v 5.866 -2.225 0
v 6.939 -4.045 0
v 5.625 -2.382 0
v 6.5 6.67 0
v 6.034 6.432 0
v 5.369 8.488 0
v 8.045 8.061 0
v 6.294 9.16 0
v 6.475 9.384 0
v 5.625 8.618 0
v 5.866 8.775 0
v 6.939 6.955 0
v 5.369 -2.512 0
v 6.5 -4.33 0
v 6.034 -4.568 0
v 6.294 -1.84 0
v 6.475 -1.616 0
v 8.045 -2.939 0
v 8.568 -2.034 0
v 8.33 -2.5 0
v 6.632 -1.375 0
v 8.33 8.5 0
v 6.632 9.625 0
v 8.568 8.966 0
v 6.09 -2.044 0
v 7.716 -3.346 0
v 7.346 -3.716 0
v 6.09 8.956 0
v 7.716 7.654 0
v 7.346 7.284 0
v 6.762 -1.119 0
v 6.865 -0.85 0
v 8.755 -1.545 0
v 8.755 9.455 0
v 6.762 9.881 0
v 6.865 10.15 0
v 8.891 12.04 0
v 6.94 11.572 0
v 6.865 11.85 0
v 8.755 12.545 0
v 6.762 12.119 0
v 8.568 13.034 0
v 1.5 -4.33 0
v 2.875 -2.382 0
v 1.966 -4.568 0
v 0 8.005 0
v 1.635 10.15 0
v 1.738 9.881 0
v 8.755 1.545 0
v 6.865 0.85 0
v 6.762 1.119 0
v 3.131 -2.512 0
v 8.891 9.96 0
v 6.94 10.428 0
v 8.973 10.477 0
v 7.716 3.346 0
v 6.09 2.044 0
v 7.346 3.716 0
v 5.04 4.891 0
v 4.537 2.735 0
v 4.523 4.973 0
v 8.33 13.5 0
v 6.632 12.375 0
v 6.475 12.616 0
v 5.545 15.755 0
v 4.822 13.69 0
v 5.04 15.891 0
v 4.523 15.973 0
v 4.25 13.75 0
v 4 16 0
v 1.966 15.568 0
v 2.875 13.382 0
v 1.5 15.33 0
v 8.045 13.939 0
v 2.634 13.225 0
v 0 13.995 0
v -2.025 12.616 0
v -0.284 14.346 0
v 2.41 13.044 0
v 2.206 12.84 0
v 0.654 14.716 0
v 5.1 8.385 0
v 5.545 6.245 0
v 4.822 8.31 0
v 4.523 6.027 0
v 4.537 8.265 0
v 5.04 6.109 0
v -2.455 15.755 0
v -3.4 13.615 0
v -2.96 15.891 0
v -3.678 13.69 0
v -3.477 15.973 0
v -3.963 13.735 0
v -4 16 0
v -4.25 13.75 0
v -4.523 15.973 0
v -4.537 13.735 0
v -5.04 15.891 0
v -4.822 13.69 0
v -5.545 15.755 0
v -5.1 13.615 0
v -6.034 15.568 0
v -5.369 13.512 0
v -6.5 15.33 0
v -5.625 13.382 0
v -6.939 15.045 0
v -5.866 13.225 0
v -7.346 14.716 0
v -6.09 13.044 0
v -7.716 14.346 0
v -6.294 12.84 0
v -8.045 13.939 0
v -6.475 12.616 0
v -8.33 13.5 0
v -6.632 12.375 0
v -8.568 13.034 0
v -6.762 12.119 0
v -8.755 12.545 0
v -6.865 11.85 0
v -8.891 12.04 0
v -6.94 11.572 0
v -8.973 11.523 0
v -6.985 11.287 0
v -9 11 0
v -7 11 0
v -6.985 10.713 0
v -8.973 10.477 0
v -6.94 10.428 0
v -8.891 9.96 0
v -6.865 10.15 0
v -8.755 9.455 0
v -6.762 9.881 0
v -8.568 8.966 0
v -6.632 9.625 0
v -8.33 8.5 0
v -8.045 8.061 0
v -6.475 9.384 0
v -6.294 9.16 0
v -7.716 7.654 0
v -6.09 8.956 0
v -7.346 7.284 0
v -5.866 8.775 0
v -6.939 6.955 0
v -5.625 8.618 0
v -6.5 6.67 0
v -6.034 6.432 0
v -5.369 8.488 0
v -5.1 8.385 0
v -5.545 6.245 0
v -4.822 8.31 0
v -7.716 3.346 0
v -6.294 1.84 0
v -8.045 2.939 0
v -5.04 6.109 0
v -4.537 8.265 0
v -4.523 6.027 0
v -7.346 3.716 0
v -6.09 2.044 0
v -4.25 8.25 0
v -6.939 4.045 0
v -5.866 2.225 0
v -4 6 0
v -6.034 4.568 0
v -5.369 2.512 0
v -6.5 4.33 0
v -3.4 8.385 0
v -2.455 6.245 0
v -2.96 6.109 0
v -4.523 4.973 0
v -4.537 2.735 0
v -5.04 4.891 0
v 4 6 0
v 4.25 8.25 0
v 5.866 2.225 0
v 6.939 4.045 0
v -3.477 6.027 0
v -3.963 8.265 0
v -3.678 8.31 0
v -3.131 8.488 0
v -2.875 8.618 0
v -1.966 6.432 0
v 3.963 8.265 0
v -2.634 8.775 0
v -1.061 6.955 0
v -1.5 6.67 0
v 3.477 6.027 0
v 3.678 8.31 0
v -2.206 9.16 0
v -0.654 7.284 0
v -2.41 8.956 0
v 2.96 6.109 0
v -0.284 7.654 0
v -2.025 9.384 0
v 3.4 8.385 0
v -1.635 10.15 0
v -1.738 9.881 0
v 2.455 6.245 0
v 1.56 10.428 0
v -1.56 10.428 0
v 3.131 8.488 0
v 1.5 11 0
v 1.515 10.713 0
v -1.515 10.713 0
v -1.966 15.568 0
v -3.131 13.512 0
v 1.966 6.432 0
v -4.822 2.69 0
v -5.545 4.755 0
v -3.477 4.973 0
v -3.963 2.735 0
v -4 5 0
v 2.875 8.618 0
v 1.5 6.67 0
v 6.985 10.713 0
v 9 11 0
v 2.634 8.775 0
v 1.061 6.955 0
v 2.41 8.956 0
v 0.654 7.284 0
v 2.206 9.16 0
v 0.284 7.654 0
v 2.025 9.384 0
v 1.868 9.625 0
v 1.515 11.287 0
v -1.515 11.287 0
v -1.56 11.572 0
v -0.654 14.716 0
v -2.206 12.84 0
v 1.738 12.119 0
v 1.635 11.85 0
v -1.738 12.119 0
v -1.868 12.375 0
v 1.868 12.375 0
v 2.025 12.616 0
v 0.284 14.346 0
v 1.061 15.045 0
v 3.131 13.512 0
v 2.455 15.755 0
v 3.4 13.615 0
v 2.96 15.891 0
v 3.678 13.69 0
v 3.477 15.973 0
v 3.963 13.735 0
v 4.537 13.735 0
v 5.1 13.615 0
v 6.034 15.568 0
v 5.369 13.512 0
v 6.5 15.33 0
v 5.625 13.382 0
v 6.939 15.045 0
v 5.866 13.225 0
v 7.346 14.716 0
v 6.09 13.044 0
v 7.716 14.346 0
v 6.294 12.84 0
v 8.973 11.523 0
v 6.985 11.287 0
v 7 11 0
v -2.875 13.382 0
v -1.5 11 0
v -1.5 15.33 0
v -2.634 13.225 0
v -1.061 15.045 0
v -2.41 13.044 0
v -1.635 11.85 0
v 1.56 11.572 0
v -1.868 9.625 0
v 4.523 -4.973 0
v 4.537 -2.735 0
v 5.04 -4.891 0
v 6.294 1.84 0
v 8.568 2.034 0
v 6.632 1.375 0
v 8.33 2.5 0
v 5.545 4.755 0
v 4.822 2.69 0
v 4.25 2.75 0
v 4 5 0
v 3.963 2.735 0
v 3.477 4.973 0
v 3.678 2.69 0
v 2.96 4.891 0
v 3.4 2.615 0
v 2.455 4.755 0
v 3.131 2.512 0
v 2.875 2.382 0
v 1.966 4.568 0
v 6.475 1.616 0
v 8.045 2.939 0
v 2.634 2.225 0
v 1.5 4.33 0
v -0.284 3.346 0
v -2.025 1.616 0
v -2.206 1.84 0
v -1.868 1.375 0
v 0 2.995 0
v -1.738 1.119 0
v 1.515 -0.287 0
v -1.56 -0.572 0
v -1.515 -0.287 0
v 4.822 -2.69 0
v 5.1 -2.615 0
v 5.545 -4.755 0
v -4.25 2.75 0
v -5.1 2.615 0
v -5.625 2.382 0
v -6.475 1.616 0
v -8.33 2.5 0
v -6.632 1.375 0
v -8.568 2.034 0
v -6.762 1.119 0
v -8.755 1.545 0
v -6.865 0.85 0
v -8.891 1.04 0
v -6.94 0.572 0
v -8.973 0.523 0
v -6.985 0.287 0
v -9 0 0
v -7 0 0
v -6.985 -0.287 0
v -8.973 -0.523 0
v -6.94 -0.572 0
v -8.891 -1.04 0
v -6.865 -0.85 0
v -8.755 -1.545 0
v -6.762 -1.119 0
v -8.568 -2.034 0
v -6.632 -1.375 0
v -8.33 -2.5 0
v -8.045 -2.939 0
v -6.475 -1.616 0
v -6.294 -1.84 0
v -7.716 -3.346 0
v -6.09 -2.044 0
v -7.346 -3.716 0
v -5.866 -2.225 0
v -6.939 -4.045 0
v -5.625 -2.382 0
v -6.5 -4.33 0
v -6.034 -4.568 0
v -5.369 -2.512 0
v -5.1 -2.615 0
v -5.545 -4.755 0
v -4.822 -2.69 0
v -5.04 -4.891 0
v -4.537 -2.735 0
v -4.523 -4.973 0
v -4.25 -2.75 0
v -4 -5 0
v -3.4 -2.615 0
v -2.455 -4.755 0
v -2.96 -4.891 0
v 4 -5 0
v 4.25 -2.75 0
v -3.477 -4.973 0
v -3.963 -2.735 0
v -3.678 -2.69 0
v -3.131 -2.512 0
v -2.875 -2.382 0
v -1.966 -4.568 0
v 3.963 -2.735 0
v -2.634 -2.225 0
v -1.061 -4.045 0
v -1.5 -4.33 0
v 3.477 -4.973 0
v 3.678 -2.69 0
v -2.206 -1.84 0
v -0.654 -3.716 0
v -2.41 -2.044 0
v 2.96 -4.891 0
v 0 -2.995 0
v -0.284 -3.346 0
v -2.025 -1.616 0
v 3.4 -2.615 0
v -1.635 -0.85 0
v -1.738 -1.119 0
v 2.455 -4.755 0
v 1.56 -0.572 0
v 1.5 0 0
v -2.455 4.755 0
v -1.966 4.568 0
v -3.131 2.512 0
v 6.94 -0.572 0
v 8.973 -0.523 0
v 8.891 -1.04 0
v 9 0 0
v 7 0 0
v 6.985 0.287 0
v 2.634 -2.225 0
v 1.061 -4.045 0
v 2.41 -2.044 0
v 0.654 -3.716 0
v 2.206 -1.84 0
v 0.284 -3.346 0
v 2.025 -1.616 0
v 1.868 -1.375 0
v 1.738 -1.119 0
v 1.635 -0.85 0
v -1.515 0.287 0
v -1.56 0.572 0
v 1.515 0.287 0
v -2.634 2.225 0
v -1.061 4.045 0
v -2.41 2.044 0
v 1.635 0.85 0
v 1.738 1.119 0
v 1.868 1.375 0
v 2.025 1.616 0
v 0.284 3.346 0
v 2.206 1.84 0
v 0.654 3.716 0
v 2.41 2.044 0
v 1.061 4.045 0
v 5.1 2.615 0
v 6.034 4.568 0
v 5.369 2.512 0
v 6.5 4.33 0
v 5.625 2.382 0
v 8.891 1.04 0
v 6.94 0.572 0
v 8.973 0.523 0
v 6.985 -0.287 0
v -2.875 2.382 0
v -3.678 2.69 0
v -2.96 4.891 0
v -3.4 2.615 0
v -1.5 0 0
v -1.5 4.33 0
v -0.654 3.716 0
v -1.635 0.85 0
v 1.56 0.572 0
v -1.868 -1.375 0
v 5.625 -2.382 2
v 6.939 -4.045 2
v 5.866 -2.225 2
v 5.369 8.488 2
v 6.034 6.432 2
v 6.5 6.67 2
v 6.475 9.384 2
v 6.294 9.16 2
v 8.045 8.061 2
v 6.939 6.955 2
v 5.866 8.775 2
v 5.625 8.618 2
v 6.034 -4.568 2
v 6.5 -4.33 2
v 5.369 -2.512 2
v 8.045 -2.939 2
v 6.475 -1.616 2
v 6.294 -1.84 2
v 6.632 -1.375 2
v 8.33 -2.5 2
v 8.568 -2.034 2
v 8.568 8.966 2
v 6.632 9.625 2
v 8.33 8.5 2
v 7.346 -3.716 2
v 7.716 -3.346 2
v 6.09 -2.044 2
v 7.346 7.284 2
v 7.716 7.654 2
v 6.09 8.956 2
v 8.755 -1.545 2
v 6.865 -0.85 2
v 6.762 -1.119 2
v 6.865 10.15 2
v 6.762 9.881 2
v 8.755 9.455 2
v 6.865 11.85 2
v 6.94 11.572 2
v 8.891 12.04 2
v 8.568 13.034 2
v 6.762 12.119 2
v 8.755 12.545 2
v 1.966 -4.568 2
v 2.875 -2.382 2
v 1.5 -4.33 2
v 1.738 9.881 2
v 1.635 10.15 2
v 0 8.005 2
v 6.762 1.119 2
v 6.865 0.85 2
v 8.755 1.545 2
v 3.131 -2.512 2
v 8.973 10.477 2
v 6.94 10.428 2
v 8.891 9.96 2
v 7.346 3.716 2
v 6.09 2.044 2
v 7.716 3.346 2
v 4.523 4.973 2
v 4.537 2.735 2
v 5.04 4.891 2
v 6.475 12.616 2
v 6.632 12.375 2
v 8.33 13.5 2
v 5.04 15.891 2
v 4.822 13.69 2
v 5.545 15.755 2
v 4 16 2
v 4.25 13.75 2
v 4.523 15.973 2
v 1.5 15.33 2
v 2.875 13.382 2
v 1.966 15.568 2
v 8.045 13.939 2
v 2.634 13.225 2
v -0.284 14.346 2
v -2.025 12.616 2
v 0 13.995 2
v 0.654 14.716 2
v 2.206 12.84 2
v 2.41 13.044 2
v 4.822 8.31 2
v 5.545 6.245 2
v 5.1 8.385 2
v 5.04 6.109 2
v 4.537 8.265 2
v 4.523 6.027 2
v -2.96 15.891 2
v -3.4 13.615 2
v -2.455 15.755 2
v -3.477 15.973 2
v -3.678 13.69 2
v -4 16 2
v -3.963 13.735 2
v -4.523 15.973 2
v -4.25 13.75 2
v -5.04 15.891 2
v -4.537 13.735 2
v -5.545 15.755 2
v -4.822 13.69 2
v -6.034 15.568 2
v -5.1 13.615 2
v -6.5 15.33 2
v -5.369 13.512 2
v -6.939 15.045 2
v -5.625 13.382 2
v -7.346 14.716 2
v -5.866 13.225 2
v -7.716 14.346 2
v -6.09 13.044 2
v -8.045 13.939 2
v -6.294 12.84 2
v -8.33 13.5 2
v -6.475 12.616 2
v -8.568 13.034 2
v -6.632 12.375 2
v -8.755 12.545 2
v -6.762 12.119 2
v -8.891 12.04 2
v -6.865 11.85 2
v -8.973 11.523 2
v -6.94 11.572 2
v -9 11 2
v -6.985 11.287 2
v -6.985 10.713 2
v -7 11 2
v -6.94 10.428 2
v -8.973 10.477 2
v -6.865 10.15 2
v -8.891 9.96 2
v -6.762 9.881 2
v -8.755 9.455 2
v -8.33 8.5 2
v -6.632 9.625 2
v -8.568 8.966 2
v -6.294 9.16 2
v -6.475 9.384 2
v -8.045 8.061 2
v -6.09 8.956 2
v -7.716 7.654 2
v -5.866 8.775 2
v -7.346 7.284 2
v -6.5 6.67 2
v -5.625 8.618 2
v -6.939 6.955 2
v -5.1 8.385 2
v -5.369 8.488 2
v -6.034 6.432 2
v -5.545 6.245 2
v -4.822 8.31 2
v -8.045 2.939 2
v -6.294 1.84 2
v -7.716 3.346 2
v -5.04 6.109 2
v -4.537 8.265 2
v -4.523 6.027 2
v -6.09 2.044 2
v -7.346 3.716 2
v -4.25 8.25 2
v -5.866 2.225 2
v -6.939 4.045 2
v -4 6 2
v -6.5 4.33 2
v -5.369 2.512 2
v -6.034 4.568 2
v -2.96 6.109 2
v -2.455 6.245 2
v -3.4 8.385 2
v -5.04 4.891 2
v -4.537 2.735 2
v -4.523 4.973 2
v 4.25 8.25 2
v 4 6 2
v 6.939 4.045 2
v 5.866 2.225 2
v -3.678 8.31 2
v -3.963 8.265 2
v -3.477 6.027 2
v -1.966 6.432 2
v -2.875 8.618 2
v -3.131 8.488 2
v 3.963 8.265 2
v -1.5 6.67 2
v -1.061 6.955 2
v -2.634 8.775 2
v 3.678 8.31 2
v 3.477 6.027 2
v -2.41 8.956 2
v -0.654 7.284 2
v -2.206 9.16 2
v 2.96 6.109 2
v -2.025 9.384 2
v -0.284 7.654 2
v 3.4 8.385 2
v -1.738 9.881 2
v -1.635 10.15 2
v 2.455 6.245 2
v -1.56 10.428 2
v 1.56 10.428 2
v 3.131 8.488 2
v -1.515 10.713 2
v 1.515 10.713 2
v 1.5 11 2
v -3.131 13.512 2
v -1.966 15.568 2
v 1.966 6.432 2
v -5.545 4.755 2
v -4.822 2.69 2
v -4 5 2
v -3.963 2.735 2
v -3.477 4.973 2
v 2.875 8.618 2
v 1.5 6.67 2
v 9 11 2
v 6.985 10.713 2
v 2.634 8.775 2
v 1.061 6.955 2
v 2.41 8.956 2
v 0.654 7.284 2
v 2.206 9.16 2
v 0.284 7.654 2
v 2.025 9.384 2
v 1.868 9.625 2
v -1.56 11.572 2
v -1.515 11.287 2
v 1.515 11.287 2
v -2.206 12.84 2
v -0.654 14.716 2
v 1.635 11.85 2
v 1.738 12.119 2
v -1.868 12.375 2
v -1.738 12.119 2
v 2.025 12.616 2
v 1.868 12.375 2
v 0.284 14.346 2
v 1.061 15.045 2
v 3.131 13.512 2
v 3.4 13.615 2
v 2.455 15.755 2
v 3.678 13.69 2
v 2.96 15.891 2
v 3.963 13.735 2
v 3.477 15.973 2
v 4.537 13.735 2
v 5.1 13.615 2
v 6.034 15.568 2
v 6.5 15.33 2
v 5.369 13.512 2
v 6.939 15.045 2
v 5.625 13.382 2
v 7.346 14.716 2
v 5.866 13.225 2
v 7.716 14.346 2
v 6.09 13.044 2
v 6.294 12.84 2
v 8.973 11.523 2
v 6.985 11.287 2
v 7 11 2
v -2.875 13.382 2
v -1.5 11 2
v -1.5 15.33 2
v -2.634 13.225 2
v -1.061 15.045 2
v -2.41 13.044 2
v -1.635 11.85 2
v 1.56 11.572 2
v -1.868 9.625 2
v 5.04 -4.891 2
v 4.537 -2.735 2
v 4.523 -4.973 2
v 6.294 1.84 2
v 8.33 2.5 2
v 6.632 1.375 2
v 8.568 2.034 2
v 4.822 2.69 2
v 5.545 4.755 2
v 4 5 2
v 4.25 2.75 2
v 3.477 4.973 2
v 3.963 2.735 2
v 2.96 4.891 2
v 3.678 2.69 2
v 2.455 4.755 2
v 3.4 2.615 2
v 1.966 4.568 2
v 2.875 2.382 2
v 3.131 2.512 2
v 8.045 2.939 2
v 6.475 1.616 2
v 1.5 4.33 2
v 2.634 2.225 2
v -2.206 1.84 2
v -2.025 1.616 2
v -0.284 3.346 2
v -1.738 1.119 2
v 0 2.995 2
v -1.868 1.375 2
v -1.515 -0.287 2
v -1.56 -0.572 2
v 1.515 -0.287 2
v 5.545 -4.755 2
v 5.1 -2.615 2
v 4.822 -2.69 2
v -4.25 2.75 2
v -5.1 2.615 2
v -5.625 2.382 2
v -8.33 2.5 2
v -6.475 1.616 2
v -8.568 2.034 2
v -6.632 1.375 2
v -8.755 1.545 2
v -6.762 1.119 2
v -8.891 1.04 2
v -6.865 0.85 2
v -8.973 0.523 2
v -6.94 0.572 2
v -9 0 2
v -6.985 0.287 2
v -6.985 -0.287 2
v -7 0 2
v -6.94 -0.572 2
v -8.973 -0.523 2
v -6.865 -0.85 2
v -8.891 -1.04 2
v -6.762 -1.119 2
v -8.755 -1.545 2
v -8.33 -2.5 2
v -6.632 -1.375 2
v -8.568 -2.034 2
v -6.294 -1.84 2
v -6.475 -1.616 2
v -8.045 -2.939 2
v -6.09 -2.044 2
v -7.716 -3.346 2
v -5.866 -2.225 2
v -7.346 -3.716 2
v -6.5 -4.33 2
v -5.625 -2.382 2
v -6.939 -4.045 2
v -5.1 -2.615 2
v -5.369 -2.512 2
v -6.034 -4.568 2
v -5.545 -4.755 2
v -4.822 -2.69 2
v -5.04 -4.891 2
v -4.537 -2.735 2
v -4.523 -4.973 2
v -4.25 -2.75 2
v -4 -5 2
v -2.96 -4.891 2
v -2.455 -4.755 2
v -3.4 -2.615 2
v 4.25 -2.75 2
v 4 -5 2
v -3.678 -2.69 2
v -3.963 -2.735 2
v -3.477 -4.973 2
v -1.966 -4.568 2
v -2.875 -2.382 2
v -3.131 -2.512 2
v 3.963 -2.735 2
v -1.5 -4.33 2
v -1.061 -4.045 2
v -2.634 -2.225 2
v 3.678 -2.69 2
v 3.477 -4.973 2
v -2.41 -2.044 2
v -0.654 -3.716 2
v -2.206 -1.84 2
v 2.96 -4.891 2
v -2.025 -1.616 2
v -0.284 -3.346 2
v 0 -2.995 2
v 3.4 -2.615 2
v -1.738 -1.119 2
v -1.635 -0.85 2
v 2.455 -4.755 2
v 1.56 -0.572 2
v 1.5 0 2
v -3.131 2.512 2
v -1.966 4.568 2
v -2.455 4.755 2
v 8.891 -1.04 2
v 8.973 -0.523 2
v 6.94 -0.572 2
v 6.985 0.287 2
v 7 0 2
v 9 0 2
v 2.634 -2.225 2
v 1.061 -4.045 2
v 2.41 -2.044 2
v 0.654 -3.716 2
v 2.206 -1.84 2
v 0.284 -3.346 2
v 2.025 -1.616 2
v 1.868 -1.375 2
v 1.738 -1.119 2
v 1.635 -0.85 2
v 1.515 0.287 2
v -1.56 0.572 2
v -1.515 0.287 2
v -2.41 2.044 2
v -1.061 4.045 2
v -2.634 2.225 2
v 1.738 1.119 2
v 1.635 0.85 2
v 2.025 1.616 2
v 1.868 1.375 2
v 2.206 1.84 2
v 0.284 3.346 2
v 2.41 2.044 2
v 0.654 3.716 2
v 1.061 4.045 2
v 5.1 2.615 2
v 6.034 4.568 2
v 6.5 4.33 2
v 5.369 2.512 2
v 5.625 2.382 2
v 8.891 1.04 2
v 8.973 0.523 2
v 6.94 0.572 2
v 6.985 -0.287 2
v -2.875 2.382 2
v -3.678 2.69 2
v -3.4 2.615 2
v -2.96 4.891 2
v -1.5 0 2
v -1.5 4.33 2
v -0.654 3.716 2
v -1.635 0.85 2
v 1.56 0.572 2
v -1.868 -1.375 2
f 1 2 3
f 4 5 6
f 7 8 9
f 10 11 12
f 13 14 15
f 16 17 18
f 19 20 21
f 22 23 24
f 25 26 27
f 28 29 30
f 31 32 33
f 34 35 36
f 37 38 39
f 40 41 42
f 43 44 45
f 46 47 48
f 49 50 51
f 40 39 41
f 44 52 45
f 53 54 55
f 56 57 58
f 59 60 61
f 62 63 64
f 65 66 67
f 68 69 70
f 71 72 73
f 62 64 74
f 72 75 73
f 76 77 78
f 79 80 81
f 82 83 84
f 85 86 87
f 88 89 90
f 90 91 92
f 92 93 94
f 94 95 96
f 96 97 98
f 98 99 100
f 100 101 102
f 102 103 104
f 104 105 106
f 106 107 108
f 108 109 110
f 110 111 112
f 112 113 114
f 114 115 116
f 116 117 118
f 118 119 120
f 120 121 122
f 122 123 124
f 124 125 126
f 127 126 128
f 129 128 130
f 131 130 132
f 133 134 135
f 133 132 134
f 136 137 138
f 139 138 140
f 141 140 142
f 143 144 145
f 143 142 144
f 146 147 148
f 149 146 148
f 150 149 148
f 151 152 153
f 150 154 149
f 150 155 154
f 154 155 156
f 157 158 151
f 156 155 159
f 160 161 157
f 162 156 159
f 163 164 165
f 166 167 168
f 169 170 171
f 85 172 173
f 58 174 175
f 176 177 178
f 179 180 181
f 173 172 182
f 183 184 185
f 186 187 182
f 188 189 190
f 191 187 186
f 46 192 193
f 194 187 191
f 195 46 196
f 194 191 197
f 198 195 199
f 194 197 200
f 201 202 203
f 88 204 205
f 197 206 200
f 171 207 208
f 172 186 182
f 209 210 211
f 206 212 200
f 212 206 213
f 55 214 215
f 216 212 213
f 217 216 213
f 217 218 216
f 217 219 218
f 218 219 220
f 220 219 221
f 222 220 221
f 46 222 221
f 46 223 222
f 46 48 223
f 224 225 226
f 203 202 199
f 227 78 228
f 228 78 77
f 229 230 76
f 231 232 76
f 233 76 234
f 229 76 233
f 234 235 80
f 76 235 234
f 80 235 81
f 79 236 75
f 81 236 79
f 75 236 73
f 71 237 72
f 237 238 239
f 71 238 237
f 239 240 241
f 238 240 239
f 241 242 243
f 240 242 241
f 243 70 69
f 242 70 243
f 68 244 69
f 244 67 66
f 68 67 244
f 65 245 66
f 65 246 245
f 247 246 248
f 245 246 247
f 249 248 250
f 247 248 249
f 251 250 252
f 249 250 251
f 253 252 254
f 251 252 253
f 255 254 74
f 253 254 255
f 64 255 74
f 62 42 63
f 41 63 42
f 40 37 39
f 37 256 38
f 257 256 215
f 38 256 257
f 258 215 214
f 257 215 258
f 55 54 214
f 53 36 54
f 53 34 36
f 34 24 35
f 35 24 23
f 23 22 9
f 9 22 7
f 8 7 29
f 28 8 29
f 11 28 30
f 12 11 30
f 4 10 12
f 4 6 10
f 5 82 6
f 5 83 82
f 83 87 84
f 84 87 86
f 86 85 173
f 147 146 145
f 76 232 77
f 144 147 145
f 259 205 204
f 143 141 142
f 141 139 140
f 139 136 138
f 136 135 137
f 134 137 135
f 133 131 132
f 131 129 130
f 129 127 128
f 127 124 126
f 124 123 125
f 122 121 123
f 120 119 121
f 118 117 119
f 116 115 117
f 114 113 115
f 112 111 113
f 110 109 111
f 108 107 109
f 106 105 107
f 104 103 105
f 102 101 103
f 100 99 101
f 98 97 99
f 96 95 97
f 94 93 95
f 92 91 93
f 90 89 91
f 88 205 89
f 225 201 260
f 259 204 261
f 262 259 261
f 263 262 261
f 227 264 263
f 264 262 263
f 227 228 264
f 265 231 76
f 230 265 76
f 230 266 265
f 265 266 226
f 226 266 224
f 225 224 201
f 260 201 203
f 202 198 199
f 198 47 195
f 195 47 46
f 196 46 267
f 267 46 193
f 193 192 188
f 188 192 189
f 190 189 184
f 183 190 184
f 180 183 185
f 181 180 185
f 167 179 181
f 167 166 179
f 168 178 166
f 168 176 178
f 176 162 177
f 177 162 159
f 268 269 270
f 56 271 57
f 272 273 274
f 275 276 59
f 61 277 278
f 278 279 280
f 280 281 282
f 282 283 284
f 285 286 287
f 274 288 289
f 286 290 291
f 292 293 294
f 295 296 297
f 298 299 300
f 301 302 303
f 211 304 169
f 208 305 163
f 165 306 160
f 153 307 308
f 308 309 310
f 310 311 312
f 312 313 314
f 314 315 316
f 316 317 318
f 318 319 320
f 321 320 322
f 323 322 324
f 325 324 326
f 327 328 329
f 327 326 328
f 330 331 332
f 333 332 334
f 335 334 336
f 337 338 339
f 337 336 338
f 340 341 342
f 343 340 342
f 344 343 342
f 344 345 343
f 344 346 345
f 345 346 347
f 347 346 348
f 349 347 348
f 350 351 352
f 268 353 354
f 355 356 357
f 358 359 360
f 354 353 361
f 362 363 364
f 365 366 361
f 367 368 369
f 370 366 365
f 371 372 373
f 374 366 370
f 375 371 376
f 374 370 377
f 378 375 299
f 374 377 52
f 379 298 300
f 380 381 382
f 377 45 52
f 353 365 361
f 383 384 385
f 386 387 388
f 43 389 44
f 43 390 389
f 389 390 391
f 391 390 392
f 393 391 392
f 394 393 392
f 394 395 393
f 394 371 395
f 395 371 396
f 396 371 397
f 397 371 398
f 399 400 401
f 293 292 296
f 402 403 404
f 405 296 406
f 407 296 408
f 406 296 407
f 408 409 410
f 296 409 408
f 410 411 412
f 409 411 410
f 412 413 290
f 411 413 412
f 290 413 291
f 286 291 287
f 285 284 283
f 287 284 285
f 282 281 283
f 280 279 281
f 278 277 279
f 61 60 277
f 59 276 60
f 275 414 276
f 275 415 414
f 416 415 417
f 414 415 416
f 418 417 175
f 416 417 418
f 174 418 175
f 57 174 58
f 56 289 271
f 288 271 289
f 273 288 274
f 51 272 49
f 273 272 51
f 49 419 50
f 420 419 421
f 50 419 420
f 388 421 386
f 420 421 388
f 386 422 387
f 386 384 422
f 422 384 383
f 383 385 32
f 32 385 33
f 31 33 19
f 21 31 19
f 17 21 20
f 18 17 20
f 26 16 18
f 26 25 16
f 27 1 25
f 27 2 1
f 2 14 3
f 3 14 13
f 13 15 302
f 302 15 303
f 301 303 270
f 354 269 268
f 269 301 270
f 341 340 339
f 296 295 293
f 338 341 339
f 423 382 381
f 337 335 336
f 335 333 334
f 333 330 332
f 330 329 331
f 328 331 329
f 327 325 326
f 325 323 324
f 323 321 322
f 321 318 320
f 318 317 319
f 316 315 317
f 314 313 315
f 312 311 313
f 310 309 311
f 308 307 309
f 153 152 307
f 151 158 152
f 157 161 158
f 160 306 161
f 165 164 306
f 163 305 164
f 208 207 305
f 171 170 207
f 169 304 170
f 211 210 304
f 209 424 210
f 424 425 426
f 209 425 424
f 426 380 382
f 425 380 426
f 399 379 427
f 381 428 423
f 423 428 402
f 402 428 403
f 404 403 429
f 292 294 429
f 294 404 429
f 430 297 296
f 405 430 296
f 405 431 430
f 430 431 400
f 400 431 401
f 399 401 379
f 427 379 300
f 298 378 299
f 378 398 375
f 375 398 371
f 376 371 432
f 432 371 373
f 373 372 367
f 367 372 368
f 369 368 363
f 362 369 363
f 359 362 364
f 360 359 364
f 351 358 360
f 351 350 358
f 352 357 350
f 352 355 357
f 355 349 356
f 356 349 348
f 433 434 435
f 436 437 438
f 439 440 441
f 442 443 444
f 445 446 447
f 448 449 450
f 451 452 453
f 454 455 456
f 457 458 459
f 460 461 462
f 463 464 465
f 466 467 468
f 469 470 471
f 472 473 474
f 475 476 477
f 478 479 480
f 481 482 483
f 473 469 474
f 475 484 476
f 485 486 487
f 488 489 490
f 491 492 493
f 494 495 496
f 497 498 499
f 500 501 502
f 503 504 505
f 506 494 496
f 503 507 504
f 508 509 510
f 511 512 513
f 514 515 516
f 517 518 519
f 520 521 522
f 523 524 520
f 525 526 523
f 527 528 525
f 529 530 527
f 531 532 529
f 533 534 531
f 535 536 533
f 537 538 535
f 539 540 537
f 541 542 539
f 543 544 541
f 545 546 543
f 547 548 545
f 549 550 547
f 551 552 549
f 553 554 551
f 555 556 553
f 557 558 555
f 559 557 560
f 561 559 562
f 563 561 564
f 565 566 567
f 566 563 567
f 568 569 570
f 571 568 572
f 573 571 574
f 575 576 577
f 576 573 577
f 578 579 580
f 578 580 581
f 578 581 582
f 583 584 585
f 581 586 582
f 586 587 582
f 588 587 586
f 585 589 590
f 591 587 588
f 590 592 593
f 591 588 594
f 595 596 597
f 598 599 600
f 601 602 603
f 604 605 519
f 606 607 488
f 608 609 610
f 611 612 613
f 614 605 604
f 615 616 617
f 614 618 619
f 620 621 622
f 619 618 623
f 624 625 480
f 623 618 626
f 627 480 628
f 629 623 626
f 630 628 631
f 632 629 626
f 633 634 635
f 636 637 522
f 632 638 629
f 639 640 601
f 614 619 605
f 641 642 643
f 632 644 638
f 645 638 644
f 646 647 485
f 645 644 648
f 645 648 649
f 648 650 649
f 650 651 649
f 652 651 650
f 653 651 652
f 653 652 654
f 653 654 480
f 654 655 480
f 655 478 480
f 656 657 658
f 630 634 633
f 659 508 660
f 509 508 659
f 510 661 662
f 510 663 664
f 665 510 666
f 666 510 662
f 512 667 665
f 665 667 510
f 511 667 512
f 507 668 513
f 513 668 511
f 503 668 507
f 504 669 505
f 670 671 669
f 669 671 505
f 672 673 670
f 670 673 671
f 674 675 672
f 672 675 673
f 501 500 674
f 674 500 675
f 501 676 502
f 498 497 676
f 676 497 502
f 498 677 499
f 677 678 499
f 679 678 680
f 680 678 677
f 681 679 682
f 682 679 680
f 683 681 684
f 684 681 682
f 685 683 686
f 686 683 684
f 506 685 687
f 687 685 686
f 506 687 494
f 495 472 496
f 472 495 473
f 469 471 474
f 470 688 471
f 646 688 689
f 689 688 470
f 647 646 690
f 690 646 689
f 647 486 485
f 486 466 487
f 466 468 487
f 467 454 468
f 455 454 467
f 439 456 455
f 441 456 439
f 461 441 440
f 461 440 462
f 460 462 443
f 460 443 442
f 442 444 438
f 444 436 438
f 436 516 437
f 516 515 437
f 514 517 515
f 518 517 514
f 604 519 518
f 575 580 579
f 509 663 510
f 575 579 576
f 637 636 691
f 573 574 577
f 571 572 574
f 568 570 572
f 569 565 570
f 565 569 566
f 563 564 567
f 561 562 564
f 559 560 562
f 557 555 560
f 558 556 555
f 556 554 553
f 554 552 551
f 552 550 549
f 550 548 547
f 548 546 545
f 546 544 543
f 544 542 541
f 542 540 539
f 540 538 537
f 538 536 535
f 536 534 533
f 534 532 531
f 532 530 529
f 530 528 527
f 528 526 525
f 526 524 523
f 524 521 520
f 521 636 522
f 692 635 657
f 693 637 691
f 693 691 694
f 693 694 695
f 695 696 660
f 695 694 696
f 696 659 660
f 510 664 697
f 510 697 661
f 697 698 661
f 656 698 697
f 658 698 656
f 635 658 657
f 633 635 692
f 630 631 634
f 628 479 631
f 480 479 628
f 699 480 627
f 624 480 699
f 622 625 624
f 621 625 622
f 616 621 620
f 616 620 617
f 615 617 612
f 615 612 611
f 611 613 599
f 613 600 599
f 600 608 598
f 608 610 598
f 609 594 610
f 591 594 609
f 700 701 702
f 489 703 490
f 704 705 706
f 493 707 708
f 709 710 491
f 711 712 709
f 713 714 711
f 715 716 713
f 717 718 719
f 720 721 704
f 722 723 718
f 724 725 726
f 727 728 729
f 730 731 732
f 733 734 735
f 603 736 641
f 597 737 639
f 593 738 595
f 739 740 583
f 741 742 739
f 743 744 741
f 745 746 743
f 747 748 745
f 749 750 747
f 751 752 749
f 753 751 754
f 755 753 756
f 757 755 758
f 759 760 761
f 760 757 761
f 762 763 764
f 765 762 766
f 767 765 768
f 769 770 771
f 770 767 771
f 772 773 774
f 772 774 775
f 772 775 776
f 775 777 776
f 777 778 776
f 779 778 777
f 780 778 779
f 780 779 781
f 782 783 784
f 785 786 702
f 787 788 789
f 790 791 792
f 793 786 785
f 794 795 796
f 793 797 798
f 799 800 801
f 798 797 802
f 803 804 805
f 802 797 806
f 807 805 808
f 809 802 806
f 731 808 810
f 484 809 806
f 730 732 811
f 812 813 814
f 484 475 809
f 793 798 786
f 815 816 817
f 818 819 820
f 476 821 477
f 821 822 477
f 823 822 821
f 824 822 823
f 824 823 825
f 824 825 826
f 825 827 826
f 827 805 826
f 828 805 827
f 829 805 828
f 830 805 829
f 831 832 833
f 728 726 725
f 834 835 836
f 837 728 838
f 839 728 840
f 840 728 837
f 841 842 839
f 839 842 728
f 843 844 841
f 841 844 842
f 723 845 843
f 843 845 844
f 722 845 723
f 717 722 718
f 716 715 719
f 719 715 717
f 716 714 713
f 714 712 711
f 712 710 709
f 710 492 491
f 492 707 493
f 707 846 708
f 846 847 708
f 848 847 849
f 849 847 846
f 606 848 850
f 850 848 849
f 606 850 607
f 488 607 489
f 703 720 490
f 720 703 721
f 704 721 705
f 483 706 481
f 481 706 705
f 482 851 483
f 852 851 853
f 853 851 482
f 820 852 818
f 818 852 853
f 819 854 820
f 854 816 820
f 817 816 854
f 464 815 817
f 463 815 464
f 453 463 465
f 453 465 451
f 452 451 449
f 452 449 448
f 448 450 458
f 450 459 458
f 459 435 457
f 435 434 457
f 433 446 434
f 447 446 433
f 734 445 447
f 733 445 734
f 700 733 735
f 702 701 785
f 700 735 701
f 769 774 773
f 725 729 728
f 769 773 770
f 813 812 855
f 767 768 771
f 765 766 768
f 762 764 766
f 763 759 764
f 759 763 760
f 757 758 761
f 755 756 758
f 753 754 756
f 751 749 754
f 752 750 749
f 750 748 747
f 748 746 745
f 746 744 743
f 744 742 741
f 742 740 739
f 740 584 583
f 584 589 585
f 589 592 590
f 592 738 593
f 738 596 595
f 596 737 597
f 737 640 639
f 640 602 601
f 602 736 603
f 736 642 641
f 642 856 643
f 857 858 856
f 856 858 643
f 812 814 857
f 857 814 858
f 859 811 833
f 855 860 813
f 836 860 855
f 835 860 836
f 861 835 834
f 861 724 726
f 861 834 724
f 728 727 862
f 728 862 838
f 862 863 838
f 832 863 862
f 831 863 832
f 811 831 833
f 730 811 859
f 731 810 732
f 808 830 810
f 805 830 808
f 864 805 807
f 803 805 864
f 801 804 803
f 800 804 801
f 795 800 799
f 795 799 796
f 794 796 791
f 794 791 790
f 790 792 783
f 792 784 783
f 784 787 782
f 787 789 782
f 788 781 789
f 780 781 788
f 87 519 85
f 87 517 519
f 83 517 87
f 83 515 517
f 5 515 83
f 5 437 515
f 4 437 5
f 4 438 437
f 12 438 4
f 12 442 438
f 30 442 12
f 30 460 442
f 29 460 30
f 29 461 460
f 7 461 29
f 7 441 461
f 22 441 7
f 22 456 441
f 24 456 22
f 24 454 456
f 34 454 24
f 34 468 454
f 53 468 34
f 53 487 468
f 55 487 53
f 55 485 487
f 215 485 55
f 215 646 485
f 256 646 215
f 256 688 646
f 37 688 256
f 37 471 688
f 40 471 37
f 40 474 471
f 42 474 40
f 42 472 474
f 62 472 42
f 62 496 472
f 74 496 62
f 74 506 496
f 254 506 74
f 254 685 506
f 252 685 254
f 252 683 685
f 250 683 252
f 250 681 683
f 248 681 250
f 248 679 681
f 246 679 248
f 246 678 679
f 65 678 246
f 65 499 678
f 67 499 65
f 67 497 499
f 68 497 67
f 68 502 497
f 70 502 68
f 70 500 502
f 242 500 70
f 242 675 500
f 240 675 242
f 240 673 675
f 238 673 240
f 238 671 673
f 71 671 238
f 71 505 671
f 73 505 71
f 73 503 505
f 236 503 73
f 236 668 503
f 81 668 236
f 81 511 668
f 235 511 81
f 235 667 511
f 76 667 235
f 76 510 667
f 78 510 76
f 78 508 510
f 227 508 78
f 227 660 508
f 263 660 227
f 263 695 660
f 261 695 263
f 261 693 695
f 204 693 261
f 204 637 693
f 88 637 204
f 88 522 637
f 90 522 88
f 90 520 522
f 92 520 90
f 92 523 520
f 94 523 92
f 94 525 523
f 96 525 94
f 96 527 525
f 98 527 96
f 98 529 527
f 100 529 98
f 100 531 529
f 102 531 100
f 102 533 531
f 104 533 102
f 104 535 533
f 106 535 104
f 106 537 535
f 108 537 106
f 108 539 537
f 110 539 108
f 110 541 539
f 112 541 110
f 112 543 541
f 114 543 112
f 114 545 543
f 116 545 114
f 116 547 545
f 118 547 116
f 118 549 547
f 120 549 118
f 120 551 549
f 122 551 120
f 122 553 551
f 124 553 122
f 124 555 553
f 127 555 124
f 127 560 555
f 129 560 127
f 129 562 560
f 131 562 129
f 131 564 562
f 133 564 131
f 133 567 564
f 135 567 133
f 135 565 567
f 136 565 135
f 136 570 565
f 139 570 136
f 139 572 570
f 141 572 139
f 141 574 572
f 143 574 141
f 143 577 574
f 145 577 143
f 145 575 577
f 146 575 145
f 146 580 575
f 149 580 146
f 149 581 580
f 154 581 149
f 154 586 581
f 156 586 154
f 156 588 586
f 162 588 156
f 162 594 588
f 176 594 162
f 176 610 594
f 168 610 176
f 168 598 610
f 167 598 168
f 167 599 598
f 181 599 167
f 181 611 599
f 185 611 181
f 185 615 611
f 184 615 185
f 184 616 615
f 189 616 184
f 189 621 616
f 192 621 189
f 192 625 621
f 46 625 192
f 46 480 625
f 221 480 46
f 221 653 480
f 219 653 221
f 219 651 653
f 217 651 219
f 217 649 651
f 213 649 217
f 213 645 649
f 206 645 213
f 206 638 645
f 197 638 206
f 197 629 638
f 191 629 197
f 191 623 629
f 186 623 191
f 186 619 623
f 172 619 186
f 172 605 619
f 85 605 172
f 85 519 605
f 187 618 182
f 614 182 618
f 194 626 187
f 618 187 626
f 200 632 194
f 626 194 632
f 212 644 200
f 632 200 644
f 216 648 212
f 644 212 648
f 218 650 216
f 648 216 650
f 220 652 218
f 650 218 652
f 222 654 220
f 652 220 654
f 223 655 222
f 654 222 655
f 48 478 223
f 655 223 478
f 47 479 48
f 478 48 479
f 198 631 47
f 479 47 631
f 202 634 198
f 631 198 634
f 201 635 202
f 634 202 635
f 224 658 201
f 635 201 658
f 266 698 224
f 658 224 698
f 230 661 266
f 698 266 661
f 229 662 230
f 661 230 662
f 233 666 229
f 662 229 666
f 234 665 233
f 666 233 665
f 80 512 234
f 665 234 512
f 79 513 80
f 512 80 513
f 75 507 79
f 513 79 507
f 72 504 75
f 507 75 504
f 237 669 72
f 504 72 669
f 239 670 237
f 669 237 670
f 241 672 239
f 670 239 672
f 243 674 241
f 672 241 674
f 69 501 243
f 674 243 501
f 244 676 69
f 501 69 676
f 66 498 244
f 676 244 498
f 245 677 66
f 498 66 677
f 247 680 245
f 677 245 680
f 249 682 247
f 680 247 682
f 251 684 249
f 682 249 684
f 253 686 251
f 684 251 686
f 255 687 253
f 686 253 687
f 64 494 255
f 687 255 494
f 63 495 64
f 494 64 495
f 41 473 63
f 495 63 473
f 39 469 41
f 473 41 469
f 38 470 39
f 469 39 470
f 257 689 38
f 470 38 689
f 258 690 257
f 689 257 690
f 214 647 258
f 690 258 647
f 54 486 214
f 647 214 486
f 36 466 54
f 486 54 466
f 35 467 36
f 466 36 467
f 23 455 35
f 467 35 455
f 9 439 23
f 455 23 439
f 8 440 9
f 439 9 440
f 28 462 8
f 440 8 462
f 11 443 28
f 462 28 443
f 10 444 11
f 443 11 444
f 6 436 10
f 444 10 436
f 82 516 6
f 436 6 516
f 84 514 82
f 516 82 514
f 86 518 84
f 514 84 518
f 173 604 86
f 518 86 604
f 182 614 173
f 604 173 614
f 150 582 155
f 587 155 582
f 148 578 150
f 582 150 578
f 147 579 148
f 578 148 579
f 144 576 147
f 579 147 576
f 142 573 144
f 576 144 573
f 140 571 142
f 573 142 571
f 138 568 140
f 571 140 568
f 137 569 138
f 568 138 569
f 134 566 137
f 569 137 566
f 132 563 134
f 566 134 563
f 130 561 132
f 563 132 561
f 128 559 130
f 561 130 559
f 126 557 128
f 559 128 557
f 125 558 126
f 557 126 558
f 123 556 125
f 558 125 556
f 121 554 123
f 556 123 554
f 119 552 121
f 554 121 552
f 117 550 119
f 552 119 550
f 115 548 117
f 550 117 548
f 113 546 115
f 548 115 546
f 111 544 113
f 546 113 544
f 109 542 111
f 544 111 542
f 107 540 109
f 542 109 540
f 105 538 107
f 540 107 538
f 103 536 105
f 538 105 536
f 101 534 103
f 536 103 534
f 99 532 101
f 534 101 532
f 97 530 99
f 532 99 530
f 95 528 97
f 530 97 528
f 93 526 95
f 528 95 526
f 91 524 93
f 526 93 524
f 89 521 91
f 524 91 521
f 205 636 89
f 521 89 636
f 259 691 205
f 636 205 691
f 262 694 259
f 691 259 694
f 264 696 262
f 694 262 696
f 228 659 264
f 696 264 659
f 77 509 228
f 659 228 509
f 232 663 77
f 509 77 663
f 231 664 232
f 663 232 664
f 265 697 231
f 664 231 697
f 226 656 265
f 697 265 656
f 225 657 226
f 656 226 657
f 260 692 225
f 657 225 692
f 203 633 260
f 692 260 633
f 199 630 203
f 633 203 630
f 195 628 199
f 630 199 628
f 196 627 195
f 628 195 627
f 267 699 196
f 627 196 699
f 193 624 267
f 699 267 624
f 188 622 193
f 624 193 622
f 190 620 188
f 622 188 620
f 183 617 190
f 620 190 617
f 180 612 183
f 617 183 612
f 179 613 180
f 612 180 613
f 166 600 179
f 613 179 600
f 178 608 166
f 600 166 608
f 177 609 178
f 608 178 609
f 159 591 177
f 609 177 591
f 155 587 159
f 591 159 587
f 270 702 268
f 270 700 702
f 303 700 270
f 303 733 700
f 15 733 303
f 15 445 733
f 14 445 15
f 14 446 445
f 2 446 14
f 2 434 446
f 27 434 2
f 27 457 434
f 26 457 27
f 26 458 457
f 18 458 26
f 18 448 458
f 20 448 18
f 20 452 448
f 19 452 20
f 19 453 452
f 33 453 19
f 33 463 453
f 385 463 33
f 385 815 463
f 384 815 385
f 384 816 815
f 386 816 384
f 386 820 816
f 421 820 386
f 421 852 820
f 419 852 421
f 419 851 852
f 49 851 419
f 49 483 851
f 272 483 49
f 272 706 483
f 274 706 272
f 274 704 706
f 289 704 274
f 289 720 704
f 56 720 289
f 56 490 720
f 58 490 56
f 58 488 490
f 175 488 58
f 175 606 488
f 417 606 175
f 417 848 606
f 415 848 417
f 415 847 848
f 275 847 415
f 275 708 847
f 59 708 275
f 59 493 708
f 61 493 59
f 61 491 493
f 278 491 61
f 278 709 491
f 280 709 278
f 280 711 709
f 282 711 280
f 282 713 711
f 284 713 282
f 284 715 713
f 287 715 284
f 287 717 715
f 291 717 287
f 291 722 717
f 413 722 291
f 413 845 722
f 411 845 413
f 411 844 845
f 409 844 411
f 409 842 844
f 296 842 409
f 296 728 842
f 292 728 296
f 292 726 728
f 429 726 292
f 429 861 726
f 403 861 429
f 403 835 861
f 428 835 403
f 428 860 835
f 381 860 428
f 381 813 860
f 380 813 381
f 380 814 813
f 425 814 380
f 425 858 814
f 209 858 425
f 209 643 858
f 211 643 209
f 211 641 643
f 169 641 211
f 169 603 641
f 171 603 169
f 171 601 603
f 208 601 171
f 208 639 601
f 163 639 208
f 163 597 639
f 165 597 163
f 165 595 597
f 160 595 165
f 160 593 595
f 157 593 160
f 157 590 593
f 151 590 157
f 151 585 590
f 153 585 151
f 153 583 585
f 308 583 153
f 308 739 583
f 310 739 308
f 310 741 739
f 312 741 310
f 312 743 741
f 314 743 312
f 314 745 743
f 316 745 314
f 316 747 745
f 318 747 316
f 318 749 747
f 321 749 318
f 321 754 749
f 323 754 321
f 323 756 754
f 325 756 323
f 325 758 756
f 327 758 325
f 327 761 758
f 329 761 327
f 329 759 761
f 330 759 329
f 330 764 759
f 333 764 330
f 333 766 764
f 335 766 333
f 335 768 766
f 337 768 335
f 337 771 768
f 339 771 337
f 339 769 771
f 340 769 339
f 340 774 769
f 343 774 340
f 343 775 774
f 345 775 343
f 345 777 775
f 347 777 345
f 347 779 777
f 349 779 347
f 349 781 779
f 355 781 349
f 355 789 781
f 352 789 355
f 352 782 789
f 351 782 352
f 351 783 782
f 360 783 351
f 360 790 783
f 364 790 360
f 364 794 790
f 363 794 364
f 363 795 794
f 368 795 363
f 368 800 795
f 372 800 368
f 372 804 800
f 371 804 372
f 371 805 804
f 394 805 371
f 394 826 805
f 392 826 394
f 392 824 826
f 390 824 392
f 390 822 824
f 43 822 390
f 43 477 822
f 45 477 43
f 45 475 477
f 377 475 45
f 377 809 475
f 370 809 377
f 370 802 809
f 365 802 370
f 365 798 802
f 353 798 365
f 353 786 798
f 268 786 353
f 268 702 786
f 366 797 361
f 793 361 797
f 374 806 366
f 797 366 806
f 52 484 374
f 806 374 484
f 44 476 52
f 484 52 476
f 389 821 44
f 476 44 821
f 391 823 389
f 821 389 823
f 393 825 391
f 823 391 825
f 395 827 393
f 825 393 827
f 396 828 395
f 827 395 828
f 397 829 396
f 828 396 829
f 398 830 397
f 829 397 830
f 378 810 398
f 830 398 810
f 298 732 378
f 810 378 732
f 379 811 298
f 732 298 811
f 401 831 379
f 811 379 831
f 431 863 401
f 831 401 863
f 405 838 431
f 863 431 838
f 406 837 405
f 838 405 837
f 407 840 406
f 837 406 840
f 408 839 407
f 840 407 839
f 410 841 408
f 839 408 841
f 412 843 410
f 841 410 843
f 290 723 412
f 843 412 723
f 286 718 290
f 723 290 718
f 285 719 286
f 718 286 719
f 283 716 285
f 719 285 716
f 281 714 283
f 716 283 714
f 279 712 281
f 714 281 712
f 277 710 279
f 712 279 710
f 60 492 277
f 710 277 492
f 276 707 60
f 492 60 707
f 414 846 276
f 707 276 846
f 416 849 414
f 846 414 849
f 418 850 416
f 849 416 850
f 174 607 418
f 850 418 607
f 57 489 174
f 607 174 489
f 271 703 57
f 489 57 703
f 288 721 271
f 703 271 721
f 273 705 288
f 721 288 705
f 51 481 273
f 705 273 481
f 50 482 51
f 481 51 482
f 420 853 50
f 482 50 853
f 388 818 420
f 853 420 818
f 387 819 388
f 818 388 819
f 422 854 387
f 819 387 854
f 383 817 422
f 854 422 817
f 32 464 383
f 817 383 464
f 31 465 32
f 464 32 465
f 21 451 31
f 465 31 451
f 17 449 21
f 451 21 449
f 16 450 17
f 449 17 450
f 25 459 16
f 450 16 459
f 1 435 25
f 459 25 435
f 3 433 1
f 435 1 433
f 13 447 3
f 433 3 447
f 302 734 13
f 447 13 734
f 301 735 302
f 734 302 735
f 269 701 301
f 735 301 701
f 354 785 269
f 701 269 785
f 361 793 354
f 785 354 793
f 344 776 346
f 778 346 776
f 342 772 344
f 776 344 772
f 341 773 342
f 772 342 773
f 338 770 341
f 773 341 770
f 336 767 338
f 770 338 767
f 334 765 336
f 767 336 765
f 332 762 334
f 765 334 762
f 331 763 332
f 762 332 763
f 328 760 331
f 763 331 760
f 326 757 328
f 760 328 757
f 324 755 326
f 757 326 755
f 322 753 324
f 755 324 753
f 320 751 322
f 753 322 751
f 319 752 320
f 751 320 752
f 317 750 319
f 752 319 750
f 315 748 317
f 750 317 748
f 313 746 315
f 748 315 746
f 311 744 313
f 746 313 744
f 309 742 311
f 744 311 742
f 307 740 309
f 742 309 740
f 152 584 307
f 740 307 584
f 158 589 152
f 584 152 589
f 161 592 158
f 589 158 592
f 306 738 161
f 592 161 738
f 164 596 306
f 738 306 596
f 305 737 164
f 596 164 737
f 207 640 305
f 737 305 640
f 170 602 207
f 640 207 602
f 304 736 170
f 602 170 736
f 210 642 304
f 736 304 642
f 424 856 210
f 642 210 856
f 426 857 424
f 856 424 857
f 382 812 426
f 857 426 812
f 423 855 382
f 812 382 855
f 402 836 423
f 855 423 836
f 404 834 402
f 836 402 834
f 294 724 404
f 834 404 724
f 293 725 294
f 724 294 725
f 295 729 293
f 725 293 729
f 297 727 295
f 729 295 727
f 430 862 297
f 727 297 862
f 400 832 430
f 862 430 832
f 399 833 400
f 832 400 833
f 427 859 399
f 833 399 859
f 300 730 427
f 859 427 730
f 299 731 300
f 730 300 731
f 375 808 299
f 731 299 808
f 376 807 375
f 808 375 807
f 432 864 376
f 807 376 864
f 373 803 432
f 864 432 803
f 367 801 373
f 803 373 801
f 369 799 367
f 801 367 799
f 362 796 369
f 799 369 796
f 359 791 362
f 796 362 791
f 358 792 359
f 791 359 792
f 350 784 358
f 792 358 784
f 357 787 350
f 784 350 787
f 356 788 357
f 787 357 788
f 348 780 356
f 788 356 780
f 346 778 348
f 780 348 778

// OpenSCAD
// needle size
holeSize = 5;
number = 2;

module earing_holder () {
    difference() {
        union() {
            translate ([4,0,0])
                scale ([1,1,1])
                circle (d=10,center=true);
            translate ([-4,0,0])
                scale ([1,1,1])
                circle (d=10,center=true);
        }
        union() {
            holeCenter = 4+5-2 -(holeSize+tolerance)/2; 
            translate ([holeCenter,0,-1])
                circle (d=holeSize+tolerance,center=true);
            translate ([-holeCenter,0,-1])
                circle (d=holeSize+tolerance,center=true);
        }
    };
}

// for volume printg
rows = 1;


tolerance = 0.5;

object_quality = 60;
$fn = object_quality;

linear_extrude(height=2)
for (j=[0:number-1]) {
    for (i=[0:rows-1]) {
        translate ([(18+2)*i,(9+2)*j,0])
        earing_holder();
    }
}
